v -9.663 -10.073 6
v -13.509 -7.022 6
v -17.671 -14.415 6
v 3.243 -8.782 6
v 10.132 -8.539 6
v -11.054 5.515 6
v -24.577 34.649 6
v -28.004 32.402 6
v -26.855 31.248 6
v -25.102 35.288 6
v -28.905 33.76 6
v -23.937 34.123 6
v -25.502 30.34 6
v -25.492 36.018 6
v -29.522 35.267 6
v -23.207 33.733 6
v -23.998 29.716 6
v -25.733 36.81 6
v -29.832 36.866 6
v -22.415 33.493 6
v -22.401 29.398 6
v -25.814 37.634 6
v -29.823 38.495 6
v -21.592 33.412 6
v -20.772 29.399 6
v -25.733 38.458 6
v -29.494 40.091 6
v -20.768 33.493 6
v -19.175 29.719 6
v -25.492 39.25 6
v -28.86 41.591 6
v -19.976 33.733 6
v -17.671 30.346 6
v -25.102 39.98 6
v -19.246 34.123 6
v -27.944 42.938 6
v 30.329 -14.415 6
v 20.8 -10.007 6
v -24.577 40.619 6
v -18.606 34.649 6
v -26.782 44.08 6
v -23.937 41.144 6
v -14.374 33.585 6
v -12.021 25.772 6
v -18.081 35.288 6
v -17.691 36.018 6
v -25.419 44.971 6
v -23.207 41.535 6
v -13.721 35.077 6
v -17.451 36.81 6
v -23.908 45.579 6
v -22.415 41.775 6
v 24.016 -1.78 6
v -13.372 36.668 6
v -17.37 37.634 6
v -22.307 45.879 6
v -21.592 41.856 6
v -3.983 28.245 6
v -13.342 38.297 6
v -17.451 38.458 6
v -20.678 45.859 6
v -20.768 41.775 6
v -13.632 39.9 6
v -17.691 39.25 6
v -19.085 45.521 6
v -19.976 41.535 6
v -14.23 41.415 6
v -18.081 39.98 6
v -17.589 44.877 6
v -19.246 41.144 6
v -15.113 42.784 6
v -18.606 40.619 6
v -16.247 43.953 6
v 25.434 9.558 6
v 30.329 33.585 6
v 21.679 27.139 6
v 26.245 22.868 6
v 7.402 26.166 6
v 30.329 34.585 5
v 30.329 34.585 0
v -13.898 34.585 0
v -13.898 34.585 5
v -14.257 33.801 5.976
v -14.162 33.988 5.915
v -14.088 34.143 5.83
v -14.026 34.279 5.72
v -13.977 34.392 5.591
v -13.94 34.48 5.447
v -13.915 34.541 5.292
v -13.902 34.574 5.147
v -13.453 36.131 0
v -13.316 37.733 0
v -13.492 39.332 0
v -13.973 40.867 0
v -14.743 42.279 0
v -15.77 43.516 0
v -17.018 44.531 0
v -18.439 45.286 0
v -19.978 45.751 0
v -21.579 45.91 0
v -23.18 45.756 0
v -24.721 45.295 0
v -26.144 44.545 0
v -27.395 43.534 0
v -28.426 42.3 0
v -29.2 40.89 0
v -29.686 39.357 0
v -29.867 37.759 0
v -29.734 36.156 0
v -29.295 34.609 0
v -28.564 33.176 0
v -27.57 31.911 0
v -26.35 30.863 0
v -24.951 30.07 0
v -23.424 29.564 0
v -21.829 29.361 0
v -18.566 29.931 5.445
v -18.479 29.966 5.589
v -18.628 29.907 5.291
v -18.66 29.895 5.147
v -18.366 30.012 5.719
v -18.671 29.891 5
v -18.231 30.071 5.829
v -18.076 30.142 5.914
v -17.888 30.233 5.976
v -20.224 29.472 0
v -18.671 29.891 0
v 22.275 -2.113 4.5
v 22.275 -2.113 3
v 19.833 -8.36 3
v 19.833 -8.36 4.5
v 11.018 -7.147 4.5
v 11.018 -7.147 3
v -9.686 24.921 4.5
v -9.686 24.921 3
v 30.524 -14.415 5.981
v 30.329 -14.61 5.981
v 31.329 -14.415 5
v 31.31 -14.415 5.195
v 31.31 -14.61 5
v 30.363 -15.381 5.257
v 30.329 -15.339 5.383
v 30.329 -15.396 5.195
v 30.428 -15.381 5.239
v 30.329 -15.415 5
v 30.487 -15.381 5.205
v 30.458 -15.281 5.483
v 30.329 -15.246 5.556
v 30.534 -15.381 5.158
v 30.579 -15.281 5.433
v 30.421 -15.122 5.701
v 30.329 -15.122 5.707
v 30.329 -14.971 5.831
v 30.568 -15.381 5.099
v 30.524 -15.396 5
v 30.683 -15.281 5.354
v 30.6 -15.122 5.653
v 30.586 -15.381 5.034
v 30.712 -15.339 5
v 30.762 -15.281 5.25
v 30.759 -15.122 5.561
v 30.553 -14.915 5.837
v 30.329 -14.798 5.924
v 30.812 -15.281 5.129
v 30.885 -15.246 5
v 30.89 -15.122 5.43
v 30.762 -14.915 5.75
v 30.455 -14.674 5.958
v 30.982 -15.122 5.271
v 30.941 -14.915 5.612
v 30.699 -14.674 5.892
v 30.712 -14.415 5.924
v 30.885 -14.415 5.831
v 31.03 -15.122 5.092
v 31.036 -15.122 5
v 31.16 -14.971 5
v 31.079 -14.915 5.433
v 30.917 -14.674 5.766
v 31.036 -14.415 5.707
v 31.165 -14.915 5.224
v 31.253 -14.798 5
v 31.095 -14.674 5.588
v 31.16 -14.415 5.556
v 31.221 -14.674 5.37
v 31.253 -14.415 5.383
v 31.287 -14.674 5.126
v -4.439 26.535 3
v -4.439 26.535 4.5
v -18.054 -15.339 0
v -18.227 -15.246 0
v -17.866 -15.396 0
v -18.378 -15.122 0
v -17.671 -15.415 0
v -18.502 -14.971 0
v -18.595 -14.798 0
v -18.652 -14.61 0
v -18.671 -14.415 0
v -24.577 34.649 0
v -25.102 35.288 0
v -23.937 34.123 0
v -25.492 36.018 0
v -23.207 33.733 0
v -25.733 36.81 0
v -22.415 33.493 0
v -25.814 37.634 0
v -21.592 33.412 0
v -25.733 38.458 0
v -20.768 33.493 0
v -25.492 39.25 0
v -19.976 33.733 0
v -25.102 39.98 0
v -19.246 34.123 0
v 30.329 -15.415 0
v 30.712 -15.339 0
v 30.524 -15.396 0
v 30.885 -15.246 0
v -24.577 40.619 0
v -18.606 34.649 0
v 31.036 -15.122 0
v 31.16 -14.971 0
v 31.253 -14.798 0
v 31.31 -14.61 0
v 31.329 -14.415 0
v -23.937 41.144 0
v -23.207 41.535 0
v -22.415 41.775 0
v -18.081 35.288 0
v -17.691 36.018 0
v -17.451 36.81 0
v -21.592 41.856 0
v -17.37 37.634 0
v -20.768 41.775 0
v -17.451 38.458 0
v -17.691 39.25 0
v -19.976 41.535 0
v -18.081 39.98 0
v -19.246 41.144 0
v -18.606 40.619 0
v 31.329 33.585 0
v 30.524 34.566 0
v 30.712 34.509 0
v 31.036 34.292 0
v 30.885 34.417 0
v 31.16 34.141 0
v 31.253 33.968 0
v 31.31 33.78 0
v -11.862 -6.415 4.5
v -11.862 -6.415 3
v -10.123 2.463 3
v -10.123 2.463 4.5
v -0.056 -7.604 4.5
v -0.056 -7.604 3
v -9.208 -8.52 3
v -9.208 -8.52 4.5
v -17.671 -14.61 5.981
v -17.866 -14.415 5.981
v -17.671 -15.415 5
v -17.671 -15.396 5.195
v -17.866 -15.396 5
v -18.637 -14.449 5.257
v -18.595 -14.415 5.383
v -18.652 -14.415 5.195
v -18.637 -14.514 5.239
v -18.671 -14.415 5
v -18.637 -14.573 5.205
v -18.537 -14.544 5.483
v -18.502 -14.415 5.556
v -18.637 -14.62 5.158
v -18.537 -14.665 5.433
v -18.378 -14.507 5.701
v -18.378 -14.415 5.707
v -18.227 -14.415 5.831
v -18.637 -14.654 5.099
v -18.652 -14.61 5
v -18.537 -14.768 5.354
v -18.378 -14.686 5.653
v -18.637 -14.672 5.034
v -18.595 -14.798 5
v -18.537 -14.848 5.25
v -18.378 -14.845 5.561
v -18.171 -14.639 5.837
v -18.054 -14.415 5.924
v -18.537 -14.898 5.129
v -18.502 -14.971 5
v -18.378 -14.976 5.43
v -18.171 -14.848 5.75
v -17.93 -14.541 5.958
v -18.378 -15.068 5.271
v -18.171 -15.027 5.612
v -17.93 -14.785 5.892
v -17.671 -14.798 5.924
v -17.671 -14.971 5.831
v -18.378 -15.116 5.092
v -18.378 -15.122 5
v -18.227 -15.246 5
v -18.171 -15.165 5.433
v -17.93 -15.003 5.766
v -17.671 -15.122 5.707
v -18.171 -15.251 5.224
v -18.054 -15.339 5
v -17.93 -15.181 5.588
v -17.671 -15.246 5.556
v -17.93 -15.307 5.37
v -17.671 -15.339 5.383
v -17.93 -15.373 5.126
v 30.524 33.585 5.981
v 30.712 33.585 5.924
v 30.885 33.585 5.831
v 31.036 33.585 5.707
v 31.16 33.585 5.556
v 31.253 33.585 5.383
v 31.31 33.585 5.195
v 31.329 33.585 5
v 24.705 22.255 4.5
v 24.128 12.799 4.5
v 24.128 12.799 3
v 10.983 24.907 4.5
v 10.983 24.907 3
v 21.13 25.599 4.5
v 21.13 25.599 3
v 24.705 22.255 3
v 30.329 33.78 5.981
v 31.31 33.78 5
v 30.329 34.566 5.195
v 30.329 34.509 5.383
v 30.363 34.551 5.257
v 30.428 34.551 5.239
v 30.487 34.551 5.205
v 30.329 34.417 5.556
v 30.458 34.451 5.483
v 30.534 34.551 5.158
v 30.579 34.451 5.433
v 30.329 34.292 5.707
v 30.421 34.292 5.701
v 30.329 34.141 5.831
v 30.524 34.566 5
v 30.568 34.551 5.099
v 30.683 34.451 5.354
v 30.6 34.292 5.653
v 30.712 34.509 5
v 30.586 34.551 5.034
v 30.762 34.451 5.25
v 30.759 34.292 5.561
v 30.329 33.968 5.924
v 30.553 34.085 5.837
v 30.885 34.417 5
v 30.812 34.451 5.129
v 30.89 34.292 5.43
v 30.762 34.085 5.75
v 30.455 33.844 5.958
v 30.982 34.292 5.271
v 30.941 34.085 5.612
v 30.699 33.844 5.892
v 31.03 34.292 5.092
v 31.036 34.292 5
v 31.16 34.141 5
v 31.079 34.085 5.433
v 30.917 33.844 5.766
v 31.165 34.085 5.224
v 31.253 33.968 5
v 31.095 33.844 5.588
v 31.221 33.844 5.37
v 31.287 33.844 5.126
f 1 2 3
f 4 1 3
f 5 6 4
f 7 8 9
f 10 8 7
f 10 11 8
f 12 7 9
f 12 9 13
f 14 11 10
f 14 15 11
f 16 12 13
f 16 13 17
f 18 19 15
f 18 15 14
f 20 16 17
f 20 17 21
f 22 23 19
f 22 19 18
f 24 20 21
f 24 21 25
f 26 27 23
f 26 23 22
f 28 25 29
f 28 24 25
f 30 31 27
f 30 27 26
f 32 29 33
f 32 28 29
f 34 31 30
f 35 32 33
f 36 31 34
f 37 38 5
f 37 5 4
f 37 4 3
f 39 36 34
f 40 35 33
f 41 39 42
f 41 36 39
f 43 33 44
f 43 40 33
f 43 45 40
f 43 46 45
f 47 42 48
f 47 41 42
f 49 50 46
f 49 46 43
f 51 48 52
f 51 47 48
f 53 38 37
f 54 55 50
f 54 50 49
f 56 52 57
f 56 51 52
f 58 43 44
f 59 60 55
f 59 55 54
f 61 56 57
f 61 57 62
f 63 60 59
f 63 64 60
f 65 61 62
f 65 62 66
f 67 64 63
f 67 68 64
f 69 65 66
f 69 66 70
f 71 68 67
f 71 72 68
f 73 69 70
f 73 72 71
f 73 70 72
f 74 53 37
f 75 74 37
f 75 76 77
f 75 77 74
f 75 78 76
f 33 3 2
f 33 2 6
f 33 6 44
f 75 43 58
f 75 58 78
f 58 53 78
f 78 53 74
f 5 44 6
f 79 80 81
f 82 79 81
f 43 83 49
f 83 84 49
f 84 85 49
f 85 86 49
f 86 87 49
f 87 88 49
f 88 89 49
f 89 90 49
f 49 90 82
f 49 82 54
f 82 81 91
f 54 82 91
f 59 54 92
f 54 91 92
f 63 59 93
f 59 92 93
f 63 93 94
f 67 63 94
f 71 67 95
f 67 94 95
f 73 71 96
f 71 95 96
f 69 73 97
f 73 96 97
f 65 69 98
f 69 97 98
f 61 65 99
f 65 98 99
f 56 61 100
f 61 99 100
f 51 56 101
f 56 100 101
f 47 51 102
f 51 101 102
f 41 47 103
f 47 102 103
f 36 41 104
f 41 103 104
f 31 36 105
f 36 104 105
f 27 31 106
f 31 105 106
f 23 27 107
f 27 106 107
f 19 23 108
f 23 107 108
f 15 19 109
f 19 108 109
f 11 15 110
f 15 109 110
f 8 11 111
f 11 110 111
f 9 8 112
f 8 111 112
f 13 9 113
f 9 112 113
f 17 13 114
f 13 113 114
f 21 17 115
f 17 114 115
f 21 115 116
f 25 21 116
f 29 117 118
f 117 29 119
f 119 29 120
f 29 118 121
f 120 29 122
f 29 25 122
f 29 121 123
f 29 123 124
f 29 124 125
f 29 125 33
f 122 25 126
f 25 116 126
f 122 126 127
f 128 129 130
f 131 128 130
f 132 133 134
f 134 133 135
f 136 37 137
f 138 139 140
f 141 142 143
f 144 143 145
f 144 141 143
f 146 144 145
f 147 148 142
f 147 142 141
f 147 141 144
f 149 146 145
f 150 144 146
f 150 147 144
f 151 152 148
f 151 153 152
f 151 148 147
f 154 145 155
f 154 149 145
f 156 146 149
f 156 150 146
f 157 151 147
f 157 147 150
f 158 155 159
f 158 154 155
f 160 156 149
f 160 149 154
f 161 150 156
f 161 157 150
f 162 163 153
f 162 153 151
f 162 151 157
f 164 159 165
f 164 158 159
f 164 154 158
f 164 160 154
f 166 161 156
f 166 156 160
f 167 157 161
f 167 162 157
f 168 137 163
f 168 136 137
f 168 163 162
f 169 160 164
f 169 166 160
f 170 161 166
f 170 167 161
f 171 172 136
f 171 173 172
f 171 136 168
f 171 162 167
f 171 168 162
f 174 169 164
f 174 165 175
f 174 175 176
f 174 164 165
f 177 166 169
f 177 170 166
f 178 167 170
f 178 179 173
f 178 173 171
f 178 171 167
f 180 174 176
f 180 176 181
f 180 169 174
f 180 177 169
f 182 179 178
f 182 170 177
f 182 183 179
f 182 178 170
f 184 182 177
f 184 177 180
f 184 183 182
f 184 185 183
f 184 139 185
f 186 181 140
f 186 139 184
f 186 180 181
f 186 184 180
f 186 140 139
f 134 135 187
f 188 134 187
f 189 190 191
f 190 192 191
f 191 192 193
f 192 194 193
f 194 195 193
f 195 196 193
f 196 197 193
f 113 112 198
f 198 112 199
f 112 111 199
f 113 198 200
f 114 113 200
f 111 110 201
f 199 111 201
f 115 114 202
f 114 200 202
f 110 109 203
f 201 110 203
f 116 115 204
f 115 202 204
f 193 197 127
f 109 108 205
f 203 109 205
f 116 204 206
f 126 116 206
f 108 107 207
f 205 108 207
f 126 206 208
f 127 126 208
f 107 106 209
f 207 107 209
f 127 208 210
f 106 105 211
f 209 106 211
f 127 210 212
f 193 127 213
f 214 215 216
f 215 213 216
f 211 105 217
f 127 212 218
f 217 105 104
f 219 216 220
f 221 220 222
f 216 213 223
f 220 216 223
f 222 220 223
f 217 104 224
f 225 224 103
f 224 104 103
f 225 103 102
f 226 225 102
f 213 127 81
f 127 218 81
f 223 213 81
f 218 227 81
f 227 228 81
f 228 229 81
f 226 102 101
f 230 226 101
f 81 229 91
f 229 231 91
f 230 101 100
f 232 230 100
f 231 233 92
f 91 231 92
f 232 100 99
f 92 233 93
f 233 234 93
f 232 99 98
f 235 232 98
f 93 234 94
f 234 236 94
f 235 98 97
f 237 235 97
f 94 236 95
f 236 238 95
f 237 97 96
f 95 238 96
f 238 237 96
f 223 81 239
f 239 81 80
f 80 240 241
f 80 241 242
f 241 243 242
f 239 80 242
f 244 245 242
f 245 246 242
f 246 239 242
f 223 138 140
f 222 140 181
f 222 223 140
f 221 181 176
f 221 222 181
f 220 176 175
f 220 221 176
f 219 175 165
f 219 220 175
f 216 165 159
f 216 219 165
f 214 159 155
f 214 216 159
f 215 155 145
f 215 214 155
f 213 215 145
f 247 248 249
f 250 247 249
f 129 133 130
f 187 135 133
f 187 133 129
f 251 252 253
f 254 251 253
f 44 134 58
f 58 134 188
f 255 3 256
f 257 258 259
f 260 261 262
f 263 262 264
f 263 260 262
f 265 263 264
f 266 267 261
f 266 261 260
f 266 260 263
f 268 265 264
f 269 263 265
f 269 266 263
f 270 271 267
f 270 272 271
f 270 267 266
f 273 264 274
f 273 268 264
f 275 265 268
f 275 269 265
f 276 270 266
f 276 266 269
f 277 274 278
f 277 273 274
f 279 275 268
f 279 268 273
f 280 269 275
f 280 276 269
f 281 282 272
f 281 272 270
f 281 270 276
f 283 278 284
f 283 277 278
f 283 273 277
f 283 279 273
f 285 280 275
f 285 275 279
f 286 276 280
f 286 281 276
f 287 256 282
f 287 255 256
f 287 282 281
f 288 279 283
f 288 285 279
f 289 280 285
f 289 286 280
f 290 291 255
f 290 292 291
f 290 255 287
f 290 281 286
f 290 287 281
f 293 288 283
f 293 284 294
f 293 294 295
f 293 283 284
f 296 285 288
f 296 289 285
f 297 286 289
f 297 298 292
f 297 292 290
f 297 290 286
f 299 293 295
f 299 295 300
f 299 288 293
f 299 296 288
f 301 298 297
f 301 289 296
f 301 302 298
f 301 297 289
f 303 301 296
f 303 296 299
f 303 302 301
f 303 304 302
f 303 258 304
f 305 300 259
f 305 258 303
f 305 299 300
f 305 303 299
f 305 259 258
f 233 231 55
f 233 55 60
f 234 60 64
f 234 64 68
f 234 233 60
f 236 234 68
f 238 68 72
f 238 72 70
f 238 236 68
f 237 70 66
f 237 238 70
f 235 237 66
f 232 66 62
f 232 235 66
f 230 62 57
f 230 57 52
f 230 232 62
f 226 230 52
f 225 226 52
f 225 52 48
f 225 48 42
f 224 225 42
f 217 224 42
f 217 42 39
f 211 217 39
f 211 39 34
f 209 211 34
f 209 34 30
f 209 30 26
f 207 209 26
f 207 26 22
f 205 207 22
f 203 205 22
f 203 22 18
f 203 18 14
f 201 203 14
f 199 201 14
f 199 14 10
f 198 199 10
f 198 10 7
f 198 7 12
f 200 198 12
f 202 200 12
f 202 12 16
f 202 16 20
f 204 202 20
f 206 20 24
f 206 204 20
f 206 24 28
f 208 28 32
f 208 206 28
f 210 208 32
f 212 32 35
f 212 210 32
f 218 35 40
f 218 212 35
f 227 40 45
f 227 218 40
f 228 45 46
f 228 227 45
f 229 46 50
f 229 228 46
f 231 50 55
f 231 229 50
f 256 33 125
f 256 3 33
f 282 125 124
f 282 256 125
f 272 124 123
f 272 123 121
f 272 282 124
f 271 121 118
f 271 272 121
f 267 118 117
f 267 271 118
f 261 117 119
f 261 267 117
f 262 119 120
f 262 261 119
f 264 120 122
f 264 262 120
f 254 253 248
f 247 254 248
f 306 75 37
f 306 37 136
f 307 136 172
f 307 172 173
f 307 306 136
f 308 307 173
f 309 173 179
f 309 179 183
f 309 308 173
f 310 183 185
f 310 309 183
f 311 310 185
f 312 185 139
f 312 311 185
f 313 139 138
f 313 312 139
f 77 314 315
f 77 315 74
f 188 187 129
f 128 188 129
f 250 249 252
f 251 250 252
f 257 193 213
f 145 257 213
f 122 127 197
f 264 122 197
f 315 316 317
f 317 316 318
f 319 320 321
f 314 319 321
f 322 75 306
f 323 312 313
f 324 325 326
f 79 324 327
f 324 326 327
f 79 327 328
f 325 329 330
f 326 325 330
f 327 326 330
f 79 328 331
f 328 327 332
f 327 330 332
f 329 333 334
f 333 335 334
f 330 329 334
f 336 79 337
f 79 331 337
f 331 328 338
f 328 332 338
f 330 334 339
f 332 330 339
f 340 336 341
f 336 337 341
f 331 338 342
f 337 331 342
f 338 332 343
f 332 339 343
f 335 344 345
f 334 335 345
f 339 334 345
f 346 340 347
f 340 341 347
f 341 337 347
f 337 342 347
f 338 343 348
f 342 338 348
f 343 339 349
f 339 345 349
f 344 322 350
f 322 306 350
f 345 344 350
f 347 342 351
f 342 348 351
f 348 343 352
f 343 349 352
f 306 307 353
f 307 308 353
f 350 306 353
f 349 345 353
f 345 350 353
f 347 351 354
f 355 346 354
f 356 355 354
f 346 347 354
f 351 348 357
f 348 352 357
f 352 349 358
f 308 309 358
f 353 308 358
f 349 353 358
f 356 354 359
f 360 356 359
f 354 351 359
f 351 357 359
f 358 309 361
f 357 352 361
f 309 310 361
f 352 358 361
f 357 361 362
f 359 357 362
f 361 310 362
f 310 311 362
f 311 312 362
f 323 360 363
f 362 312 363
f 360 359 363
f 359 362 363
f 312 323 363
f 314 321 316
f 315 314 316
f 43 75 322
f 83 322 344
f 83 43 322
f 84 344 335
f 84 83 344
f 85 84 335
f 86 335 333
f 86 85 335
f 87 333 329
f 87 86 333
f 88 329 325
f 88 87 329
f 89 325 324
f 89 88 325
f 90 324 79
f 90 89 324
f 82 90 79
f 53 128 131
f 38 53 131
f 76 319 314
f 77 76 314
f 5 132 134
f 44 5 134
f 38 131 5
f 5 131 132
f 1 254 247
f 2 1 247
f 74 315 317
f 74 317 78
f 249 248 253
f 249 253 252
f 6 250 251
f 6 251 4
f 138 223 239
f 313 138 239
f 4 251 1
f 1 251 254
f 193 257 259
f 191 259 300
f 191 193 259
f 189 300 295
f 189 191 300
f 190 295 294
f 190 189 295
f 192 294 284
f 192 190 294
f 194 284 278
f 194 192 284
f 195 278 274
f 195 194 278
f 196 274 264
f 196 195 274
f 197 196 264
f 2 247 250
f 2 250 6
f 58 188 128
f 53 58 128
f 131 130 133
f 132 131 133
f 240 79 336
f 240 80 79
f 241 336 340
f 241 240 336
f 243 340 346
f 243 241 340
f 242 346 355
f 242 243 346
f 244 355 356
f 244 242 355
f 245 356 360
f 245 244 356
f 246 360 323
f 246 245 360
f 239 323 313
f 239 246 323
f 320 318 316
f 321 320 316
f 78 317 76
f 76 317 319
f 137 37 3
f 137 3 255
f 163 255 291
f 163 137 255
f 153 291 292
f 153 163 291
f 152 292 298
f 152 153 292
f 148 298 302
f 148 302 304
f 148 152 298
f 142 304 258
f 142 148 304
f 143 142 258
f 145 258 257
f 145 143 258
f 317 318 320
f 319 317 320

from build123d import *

# Parameters (mm, degrees)
F0_R     = 4.222035
F1_DEPTH = 6
F2_DEPTH = 3
F3_SIZE  = 1.5
F4_R     = 1


with BuildPart() as f1:
    # F0 (on Top) → F1 (new body)
    with BuildSketch(Plane.XY):
        with BuildLine():
            Line((31.328976, 34.585057), (-13.897816, 34.585057))
            ThreePointArc((-13.897816, 34.585057), (-27.394685, 43.53433), (-18.671024, 29.890551))
            Line((-18.671024, 29.890551), (-18.671024, -15.414943))
            Line((-18.671024, -15.414943), (31.328976, -15.414943))
            Line((31.328976, -15.414943), (31.328976, 34.585057))
        make_face()
        Polygon((-10.122895, 2.46298), (-0.055609, -7.604307), (-9.207687, -8.519513), (-11.86179, -6.414536), align=None, mode=Mode.SUBTRACT)
        Polygon((11.018406, -7.146703), (-9.685952, 24.921147), (-4.439394, 26.535474), (22.275463, -2.113059), (19.833142, -8.3599), align=None, mode=Mode.SUBTRACT)
        with Locations((-21.591602, 37.633959)):
            Circle(F0_R, mode=Mode.SUBTRACT)
        Polygon((24.128397, 12.799296), (10.983175, 24.906736), (21.130362, 25.598589), (24.704942, 22.254631), align=None, mode=Mode.SUBTRACT)
    extrude(amount=F1_DEPTH)

    # F0 (on Top) → F2 (join)
    with BuildSketch(Plane.XY):
        with BuildLine():
            Line((31.328976, 34.585057), (-13.897816, 34.585057))
            ThreePointArc((-13.897816, 34.585057), (-27.394685, 43.53433), (-18.671024, 29.890551))
            Line((-18.671024, 29.890551), (-18.671024, -15.414943))
            Line((-18.671024, -15.414943), (31.328976, -15.414943))
            Line((31.328976, -15.414943), (31.328976, 34.585057))
        make_face()
        Polygon((-10.122895, 2.46298), (-0.055609, -7.604307), (-9.207687, -8.519513), (-11.86179, -6.414536), align=None, mode=Mode.SUBTRACT)
        Polygon((11.018406, -7.146703), (-9.685952, 24.921147), (-4.439394, 26.535474), (22.275463, -2.113059), (19.833142, -8.3599), align=None, mode=Mode.SUBTRACT)
        with Locations((-21.591602, 37.633959)):
            Circle(F0_R, mode=Mode.SUBTRACT)
        Polygon((24.128397, 12.799296), (10.983175, 24.906736), (21.130362, 25.598589), (24.704942, 22.254631), align=None, mode=Mode.SUBTRACT)
        Polygon((-4.439394, 26.535474), (-9.685952, 24.921147), (11.018406, -7.146703), (19.833142, -8.3599), (22.275463, -2.113059), align=None)
        Polygon((21.130362, 25.598589), (10.983175, 24.906736), (24.128397, 12.799296), (24.704942, 22.254631), align=None)
        Polygon((-9.207687, -8.519513), (-0.055609, -7.604307), (-10.122895, 2.46298), (-11.86179, -6.414536), align=None)
    extrude(amount=F2_DEPTH)

    # F3
    f3_edges = [f1.edges().sort_by_distance(p)[0] for p in [
        (8.918034, 12.211207, 6),
        (-7.062673, 25.72831, 6),
        (0.666227, 8.887222, 6),
        (15.425774, -7.753301, 6),
        (21.054302, -5.23648, 6),
        (22.917652, 23.92661, 6),
        (16.056768, 25.252663, 6),
        (17.555786, 18.853016, 6),
        (24.416669, 17.526963, 6),
        (-5.089252, -2.570663, 6),
        (-10.992342, -1.975778, 6),
        (-10.534738, -7.467025, 6),
        (-4.631648, -8.06191, 6),
    ]]
    chamfer(f3_edges, length=F3_SIZE)

    # F4
    f4_edges = [f1.edges().sort_by_distance(p)[0] for p in [
        (31.328976, 9.585057, 6),
        (6.328976, -15.414943, 6),
        (8.71558, 34.585057, 6),
        (-18.671024, 7.237804, 6),
        (-18.671024, -15.414943, 3),
        (31.328976, -15.414943, 3),
        (31.328976, 34.585057, 3),
    ]]
    fillet(f4_edges, radius=F4_R)


solid = f1.part
